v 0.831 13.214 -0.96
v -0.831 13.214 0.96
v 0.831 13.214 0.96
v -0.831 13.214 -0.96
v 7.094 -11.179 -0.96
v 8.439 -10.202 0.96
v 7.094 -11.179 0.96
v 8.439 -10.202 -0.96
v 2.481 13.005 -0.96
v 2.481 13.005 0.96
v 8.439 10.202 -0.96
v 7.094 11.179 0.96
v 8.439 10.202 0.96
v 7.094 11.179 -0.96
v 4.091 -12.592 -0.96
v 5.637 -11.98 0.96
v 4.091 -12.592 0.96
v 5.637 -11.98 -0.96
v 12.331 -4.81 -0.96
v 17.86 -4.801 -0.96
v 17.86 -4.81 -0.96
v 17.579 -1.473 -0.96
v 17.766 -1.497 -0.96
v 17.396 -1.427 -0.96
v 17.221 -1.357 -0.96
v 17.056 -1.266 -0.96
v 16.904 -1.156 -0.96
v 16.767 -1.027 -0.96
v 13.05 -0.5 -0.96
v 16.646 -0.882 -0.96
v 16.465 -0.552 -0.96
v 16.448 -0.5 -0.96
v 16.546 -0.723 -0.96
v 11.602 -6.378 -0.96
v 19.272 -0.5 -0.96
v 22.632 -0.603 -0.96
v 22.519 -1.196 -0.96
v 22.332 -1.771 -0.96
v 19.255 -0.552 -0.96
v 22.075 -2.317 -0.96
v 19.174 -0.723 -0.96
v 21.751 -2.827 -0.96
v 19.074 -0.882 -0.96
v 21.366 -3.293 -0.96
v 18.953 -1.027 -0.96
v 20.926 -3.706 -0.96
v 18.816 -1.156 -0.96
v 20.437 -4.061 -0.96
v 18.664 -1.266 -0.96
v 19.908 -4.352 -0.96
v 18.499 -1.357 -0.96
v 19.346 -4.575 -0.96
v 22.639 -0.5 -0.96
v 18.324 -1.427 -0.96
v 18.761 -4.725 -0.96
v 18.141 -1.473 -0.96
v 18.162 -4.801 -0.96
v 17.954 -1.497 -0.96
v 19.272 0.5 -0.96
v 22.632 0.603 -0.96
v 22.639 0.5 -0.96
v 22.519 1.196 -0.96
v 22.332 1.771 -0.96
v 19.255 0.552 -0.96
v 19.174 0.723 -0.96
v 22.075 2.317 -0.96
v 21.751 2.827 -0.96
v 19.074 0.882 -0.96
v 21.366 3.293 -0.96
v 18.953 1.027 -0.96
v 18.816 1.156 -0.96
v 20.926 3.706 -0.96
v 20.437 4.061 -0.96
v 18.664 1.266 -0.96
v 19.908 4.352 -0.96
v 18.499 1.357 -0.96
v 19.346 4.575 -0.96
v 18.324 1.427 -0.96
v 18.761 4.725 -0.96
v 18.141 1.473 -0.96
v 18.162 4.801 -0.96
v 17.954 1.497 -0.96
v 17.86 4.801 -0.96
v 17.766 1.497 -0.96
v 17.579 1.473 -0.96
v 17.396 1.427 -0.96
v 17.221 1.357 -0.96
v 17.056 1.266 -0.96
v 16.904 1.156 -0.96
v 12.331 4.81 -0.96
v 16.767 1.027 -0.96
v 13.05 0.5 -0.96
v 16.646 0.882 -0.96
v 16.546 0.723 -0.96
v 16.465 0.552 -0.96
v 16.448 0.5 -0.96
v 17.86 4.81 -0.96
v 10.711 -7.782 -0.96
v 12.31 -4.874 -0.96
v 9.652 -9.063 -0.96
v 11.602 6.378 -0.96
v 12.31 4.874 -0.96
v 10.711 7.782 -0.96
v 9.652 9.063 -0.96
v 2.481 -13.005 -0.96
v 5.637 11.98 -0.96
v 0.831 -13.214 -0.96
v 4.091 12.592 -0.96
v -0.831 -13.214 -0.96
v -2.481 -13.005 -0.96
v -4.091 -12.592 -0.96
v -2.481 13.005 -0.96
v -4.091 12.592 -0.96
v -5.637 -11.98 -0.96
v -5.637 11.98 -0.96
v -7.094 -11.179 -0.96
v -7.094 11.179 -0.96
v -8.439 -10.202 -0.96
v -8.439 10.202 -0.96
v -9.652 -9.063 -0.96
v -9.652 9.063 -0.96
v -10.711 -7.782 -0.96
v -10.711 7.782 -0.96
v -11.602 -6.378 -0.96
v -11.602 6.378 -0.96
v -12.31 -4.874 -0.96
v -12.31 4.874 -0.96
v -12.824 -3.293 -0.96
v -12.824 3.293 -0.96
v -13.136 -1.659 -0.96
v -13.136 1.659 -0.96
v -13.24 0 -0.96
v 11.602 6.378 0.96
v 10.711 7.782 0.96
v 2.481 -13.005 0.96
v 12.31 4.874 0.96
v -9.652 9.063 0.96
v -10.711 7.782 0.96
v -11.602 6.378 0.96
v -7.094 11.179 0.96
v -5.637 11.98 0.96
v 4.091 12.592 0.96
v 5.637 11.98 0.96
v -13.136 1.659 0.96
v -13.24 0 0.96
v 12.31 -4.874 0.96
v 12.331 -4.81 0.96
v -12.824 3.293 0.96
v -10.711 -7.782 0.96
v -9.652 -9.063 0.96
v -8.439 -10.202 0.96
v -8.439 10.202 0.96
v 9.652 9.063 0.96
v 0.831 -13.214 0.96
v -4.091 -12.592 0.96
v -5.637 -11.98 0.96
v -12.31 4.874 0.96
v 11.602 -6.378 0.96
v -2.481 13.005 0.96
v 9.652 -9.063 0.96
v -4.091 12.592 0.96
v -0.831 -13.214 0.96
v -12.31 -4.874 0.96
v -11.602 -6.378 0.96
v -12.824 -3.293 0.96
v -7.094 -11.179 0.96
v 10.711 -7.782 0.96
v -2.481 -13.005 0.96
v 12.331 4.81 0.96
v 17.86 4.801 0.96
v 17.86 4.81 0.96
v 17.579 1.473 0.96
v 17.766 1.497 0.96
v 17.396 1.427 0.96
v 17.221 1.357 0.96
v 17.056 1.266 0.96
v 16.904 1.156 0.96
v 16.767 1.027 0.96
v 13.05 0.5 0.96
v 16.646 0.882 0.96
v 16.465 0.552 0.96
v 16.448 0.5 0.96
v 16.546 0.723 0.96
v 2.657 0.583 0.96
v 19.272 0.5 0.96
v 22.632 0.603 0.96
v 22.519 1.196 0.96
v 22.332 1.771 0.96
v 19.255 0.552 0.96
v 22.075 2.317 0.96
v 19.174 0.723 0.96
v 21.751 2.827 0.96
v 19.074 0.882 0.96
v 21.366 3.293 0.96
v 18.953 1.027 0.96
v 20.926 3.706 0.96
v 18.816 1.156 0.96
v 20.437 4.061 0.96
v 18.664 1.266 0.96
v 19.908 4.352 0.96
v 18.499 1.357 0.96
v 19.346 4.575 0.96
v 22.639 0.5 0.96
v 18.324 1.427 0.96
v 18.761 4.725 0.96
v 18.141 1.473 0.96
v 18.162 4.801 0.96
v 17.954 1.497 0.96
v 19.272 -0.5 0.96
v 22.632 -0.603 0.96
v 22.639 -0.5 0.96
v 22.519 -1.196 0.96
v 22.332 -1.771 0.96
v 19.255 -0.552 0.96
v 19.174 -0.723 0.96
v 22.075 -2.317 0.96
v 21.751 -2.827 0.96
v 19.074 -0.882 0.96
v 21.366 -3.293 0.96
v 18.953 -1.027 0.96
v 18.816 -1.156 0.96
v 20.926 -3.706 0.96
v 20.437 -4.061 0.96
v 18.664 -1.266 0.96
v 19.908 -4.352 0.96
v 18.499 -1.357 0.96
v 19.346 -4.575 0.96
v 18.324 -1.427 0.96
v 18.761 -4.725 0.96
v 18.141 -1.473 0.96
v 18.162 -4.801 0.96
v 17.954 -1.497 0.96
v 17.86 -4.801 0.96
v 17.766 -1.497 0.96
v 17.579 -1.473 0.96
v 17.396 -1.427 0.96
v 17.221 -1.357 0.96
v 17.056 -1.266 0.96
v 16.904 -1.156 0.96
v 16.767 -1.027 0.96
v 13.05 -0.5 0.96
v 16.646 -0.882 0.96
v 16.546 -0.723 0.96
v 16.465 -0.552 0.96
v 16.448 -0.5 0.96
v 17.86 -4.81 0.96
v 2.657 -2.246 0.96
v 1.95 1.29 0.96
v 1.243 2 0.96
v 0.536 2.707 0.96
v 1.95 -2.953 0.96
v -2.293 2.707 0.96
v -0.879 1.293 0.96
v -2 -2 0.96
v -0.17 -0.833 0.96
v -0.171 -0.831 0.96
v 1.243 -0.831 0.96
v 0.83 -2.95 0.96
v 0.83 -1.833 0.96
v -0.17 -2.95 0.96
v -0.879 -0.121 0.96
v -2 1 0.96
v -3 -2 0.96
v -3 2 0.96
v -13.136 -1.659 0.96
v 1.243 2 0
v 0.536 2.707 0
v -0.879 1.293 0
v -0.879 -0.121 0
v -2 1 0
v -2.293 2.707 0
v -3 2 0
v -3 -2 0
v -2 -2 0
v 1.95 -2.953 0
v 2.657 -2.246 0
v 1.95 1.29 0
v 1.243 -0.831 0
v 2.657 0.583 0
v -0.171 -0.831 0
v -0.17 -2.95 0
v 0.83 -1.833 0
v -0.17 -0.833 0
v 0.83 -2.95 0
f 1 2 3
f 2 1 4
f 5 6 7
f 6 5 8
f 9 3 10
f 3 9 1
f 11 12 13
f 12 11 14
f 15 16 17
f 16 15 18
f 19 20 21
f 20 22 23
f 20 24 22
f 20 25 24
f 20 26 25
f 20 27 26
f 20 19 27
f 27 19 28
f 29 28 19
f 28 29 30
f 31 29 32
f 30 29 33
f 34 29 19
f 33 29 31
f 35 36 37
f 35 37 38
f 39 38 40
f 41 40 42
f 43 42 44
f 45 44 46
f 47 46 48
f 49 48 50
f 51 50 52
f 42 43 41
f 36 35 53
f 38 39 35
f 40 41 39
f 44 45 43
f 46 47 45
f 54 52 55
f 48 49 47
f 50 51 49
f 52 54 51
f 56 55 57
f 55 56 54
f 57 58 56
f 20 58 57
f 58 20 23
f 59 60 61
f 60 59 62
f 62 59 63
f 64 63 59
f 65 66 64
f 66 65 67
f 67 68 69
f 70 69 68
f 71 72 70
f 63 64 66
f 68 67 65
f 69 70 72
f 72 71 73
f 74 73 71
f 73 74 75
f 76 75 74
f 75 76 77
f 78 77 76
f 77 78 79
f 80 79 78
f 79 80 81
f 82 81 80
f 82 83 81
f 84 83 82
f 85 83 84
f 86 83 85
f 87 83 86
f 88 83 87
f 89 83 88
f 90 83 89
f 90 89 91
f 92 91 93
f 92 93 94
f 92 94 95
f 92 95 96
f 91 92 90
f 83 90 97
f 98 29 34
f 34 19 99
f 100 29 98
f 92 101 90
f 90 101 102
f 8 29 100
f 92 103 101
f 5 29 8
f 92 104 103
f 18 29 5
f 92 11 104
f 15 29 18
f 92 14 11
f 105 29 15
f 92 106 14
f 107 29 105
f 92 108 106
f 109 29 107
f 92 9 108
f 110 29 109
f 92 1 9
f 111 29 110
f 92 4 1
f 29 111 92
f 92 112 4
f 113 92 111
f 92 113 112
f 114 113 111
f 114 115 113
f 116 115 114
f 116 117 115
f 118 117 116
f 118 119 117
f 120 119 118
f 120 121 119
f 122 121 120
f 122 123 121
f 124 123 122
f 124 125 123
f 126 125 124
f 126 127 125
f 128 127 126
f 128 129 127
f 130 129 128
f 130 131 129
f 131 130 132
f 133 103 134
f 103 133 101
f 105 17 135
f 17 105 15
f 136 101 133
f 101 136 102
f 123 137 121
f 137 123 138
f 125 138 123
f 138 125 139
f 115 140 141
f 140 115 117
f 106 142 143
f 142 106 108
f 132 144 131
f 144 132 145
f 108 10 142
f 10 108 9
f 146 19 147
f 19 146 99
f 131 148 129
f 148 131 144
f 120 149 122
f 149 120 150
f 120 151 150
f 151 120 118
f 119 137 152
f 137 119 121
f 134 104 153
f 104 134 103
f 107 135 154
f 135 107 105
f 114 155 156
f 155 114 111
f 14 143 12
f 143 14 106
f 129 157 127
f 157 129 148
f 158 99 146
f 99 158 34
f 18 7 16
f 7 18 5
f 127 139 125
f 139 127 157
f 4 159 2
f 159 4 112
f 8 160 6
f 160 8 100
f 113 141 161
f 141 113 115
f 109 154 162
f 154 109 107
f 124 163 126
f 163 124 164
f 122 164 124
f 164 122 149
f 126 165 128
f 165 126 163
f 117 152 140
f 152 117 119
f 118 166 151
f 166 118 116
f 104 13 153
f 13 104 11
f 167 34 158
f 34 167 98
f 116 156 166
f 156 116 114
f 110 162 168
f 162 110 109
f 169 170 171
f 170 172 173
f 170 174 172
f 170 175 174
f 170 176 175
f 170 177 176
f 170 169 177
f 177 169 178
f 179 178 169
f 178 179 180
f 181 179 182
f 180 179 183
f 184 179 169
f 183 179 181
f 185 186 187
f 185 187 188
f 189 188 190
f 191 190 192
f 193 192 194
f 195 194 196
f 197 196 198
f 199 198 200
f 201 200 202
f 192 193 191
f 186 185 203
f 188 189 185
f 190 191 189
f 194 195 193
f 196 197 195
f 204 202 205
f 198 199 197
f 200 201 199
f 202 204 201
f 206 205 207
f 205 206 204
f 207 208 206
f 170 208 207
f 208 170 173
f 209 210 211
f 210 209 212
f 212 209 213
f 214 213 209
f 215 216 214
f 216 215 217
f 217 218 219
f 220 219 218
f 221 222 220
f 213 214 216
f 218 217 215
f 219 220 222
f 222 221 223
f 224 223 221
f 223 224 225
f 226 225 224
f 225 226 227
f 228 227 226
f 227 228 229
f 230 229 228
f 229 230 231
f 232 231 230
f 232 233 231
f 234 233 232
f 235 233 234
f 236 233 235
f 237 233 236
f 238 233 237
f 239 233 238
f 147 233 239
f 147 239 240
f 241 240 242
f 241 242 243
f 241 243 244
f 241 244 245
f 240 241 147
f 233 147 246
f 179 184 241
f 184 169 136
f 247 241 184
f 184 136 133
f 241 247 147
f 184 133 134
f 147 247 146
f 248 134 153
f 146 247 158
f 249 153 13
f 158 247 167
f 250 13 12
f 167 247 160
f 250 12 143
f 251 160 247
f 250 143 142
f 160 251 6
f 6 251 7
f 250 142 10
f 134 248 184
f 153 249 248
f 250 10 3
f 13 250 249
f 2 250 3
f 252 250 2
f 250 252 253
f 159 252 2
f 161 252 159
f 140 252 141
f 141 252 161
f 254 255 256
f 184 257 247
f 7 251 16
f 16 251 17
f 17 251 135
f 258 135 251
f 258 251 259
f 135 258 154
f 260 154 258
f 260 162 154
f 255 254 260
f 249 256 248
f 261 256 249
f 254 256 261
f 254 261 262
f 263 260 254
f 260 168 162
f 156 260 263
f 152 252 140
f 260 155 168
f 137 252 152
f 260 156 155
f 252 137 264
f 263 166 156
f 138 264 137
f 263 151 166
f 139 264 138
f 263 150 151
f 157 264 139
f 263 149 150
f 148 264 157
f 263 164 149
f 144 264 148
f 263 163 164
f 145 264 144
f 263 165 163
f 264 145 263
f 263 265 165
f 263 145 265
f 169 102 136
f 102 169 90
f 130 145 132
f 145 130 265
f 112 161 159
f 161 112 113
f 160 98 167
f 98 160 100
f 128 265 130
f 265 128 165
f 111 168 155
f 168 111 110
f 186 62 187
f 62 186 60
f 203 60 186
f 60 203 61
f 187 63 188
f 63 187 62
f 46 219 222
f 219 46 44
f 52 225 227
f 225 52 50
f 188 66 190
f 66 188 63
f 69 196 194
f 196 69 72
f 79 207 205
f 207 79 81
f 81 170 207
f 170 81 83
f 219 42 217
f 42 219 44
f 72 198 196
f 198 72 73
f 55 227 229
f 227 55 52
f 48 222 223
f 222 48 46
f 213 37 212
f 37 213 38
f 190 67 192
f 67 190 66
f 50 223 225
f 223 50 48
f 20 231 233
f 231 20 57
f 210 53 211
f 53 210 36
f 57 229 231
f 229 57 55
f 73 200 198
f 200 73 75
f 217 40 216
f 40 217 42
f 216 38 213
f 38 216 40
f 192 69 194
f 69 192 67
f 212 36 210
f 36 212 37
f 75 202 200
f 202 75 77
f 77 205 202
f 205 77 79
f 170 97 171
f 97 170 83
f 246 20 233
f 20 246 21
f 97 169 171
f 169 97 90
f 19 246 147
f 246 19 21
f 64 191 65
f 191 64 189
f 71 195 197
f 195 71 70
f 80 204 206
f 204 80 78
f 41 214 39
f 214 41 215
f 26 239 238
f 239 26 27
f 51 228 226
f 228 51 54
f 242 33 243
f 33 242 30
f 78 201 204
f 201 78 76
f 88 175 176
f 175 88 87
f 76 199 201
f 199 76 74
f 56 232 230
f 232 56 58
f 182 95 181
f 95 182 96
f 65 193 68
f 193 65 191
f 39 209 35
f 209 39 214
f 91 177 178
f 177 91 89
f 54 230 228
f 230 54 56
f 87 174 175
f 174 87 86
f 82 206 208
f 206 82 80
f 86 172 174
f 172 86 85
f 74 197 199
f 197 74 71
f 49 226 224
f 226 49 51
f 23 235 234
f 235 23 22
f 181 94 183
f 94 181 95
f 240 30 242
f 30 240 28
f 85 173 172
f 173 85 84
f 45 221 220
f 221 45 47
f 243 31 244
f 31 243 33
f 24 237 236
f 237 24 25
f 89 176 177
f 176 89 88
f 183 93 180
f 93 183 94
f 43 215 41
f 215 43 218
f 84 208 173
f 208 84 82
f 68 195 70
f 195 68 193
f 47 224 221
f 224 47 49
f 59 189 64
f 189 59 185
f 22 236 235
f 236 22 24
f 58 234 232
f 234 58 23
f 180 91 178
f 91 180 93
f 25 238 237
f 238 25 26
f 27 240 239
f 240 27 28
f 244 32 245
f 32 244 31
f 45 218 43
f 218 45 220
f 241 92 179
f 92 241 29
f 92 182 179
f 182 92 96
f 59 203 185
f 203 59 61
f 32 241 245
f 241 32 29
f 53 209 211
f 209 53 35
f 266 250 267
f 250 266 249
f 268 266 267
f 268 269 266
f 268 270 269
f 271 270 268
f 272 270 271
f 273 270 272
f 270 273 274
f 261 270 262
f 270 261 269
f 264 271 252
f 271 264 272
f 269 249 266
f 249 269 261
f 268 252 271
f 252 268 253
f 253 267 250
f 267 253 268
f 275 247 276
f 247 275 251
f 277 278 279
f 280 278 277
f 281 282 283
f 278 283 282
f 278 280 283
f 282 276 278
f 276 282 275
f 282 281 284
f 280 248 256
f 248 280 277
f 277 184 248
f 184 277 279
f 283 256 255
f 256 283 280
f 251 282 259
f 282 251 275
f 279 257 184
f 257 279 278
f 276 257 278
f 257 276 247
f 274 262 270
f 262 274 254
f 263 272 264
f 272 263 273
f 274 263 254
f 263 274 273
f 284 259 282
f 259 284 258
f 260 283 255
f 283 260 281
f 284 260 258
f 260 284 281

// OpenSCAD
Diameter=26.48;
Thickness=1.92;
RingDia=3;
SlotThick=1;
$fn=50;

difference(){
    union(){
        cylinder(d=Diameter,h=Thickness,center=true);
        translate([3*Diameter/4-2,0,0])cylinder(d=Diameter/4+RingDia,h=Thickness,center=true);
        translate([Diameter/2-2,0,0])cube([Diameter/2,Diameter/4+RingDia,Thickness], center=true);
    }
    translate([3*Diameter/4-2,0,0]){
        union(){
            cylinder(d=RingDia,h=Thickness*2,center=true);
            cube([Diameter/4+RingDia,SlotThick,Thickness*2],center=true);
            
        }
        translate([-3*Diameter/4-1,-2,0])Signature();
    }
}


module Signature(){
    cube([1,4,1]);
    translate([0,4,0]){
        rotate([0,0,45])translate([0,-3,0]){
            difference(){
                cube([3,3,1]);
                translate([1,1,-1])cube([3,3,3]);
            }
        }
    }
    translate([4.95,3.29,0]){
        rotate([0,0,-45])translate([0,-3,0]){
            difference(){
                cube([3,3,1]);
                translate([1,1,-1])cube([3,3,3]);
            }
        }
    }
    translate([2.83,-0.95,0])cube([1,2.12,1]);
}
